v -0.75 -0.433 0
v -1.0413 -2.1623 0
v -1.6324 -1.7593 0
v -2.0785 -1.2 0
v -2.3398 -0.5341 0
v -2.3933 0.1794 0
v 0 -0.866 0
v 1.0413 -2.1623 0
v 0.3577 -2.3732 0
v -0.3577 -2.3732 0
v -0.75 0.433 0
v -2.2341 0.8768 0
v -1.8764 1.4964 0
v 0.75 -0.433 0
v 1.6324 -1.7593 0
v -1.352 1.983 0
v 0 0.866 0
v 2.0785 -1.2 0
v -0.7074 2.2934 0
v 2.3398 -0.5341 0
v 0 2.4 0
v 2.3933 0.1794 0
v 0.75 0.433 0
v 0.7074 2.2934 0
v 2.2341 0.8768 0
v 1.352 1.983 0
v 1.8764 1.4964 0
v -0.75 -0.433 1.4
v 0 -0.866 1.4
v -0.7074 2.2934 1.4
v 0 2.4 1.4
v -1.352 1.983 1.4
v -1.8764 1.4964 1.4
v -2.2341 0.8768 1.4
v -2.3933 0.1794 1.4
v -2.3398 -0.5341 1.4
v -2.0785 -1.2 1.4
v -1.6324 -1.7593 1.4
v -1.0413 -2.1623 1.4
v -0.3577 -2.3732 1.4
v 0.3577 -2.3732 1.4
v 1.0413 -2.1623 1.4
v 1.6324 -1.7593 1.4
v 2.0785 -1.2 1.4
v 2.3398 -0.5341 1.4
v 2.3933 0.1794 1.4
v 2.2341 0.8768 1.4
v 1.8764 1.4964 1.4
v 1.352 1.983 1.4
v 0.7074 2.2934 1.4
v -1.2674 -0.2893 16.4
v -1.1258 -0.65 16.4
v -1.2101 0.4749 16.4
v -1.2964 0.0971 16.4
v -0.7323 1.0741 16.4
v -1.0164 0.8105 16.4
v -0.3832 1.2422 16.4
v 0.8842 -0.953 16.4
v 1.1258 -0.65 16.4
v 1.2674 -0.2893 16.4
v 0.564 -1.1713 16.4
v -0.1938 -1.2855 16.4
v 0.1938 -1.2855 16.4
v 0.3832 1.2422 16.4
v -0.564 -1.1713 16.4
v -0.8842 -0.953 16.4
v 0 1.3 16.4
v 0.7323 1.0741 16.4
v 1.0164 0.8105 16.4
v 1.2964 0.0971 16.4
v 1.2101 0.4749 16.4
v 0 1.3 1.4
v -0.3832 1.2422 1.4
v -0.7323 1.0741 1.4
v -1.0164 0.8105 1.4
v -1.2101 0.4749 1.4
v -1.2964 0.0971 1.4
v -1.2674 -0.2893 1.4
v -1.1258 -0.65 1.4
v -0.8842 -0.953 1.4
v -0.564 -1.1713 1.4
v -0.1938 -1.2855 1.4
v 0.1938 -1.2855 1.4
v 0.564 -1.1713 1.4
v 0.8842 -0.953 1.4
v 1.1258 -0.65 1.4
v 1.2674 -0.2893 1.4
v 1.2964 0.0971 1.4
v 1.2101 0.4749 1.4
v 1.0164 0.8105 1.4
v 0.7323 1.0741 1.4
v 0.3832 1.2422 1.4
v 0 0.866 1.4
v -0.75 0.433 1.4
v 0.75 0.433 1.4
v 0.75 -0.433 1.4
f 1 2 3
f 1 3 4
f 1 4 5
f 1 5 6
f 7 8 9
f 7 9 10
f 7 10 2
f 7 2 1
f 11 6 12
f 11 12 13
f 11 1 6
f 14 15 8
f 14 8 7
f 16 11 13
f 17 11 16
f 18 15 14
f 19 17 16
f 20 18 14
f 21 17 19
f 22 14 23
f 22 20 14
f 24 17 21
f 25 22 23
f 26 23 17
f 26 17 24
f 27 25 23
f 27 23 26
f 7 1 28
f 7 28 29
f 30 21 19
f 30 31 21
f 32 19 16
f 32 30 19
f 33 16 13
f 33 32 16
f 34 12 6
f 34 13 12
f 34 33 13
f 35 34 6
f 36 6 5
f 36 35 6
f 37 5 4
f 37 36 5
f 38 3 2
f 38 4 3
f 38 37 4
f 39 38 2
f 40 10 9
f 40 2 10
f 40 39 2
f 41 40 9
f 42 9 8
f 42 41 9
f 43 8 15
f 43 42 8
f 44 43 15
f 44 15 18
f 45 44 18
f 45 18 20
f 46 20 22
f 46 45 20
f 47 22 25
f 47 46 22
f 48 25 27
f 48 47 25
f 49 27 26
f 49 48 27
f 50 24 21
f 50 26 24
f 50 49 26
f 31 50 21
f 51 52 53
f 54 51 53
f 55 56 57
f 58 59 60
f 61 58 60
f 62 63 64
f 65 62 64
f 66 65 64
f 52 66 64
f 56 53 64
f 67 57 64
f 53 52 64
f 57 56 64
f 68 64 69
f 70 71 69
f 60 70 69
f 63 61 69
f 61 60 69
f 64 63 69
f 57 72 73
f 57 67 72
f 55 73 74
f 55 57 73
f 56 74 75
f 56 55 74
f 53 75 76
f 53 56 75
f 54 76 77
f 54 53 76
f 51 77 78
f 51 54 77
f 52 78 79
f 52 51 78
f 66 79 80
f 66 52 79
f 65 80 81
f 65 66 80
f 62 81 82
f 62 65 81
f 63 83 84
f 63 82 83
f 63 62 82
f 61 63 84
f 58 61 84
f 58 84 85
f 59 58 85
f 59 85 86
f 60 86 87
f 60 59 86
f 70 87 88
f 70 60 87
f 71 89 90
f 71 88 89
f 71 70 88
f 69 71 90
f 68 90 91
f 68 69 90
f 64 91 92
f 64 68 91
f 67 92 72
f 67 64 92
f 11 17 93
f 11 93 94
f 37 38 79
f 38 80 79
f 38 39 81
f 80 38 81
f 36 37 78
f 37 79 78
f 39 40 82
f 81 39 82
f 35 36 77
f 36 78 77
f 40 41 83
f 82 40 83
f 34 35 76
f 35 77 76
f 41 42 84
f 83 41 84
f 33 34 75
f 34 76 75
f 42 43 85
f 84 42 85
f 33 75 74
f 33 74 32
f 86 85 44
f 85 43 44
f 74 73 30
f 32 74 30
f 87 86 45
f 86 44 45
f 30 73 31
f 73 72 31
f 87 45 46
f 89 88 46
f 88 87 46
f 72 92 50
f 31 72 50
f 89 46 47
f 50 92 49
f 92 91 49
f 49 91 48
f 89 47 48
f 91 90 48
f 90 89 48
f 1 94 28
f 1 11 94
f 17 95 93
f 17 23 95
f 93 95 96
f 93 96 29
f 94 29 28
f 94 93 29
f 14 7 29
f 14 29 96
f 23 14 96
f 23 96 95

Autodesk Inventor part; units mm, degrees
ref_plane "YZ Plane" through (0, 0, 0) normal (1, 0, 0) x (0, 1, 0)
ref_plane "XZ Plane" through (0, 0, 0) normal (0, 1, 0) x (-1, 0, 0)
ref_plane "XY Plane" through (0, 0, 0) normal (0, 0, 1) x (1, 0, 0)
sketch "スケッチ1" plane through (0, 0, 0) normal (1, 0, 0) x (0, 1, 0)
  line L0 (0, 16.4) -> (0, 0)
  line L1 (0, 0) -> (2.4, 0)
  line L2 (2.4, 0) -> (2.4, 1.4)
  line L3 (2.4, 1.4) -> (1.3, 1.4)
  line L4 (1.3, 1.4) -> (1.3, 16.4)
  line L5 (1.3, 16.4) -> (0, 16.4)
  dimension "d1" = 1.3
  dimension "d2" = 1.4
  dimension "d3" = 2.4
  dimension "d10" = 15
revolve "回転1" add sketch "スケッチ1" angle 360 about axis through (0, 0, 16.4) along (0, 0, -1)
thread "ねじ1" size "M2.6x0.45" class "6g" standard "ANSI Metric M Profile" full length
sketch "スケッチ2" plane through (0, 0, 0) normal (0, 0, -1) x (-1, 0, 0)
  line L0 (0, 0.866) -> (0.75, 0.433)
  line L1 (0.75, 0.433) -> (0.75, -0.433)
  line L2 (0.75, -0.433) -> (0, -0.866)
  line L3 (0, -0.866) -> (-0.75, -0.433)
  line L4 (-0.75, -0.433) -> (-0.75, 0.433)
  line L5 (-0.75, 0.433) -> (0, 0.866)
  line L6 (0, 2.4) -> (0, -2.4) construction
  circle A0 centre (0, 0) radius 2.4 projected
  point P0 (0, 0)
  point P1 (0, 0)
  dimension "d7" = 1.5
extrude "押し出し1" cut sketch "スケッチ2" against normal blind 1.4 contours L0 L1 L2 L3 L4 L5
properties part number "M2_6-15" material "チタン"
